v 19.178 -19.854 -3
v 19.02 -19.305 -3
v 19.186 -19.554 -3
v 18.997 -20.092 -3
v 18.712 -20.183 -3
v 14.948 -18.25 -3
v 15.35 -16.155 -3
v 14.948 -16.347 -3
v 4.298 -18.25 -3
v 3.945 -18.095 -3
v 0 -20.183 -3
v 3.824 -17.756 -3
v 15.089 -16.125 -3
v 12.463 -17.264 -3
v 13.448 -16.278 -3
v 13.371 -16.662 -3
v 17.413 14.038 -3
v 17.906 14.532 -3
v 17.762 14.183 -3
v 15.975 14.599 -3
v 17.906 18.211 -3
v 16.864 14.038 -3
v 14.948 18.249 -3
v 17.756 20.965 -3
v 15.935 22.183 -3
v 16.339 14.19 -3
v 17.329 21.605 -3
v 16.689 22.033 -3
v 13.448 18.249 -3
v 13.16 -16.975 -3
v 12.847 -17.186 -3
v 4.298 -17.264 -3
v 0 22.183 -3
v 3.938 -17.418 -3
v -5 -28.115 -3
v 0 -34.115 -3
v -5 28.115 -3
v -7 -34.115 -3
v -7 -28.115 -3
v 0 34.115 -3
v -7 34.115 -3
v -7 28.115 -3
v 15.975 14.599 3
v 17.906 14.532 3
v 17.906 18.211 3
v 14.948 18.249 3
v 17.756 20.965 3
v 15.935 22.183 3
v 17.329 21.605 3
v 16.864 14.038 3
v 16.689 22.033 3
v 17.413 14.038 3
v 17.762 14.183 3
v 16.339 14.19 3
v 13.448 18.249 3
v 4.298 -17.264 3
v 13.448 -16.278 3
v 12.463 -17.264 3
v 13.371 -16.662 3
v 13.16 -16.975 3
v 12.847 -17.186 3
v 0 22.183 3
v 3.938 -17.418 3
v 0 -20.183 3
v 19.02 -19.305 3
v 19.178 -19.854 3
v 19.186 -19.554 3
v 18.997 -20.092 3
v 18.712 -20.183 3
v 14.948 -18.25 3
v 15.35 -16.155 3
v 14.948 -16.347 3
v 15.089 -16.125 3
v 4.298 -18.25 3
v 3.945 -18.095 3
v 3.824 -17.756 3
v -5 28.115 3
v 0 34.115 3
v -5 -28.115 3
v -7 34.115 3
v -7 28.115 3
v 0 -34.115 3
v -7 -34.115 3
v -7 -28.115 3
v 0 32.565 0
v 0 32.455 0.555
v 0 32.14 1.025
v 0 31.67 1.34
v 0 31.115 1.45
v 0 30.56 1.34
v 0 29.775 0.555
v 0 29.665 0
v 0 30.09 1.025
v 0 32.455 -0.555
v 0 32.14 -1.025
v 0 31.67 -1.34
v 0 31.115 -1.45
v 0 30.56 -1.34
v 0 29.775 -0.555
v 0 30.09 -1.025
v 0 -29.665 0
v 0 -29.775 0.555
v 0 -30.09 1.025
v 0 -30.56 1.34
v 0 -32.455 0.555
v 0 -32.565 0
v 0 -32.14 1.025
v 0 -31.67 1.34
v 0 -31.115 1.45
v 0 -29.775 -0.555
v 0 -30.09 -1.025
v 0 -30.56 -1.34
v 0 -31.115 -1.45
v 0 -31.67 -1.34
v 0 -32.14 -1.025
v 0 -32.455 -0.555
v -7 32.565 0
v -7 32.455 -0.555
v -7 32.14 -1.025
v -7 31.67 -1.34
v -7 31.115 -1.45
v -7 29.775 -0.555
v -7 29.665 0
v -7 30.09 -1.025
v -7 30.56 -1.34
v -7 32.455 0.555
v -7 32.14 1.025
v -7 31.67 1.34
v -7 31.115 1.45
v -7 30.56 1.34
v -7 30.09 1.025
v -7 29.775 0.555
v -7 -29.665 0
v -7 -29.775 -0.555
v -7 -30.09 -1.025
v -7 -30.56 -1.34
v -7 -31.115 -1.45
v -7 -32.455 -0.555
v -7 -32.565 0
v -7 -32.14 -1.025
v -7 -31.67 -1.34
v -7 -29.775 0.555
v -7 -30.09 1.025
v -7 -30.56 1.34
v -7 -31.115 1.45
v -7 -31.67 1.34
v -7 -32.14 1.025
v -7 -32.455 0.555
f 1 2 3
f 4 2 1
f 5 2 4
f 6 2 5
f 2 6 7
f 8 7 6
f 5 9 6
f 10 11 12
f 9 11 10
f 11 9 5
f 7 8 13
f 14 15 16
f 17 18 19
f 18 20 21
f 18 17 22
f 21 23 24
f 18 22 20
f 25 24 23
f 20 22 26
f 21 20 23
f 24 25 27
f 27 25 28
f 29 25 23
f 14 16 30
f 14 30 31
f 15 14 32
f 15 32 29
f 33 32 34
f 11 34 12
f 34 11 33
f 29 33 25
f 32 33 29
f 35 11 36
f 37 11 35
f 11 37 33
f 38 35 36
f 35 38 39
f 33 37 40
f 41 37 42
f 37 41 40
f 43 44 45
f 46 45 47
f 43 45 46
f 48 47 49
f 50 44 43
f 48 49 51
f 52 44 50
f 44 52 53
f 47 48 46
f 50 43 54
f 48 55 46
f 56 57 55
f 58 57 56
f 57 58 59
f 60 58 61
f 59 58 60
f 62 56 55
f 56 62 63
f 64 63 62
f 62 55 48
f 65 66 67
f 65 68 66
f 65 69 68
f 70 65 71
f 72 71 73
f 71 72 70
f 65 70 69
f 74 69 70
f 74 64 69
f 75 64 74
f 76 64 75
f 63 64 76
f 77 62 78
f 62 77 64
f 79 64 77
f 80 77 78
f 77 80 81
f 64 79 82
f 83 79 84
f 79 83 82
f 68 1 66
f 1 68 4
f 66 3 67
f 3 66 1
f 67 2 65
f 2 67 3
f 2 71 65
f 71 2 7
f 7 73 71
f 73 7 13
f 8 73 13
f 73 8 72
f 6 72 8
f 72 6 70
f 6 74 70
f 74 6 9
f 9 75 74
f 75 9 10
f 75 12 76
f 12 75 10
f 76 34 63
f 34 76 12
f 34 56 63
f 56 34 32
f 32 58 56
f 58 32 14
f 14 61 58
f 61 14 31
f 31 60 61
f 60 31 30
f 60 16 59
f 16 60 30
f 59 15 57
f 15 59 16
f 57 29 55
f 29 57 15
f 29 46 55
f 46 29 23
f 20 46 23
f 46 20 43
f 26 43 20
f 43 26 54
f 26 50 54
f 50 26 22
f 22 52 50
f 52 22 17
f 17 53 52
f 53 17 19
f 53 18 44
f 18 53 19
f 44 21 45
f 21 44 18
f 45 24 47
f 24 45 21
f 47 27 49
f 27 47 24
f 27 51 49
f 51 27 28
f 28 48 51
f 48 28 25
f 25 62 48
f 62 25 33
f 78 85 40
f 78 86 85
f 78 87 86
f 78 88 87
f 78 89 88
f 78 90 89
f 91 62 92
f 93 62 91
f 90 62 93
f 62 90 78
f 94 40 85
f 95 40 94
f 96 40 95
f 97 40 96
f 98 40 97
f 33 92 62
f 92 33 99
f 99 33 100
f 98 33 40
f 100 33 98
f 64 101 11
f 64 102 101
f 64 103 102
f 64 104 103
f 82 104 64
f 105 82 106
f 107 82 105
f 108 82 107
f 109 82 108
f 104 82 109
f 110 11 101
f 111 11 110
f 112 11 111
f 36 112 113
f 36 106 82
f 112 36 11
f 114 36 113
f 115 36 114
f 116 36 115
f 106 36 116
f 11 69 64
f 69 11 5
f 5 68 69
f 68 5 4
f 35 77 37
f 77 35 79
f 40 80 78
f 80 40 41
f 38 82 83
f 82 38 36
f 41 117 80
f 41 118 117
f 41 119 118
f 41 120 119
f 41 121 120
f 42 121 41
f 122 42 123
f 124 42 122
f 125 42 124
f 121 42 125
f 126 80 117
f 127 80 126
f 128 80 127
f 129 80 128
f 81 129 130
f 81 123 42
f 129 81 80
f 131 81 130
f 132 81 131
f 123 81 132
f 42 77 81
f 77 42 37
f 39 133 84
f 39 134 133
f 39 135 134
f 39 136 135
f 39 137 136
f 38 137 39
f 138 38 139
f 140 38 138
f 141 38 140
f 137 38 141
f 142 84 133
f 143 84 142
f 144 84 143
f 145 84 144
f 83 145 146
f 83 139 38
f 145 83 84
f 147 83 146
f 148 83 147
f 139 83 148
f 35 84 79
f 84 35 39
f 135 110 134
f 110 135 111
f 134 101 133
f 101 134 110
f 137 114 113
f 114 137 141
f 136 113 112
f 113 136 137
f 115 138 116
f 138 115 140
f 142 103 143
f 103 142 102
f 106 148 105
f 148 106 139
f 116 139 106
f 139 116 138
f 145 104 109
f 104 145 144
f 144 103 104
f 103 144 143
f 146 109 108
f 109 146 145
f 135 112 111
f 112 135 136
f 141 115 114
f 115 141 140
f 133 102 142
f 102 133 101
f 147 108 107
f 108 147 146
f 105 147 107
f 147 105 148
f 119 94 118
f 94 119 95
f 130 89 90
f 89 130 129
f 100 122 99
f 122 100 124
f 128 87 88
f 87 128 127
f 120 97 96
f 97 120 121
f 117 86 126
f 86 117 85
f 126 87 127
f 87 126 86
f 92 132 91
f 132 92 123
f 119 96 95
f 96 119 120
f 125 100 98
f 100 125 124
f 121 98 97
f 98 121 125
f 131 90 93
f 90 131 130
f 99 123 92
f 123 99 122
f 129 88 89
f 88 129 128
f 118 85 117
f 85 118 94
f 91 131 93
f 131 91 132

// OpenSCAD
// Remix of http://www.thingiverse.com/thing:806093

//Clip thickness
CLIP_H = 6;
// Holes diameter
HOLE_DIAMETER = 2.9;
// Distance between the 2 holes
PILLAR_PITCH = 62.23;

// Height of the mounting bar
MOUNT_H = 5;
// Height of pillars
PILLAR_H = 2;

PILLAR_1_Y_OFFSET = PILLAR_PITCH/2;
PILLAR_2_Y_OFFSET = -PILLAR_PITCH/2;

module shape()
{
    p = [[9.403850,21.092300],[9.584450,20.854000],[9.593250,20.554200],[9.427250,20.305200],[5.756350,17.154800],[5.495650,17.124500],[5.354950,17.347200],[5.354950,19.249500],[-5.295400,19.249500],[-5.647940,19.095200],[-5.769030,18.756400],[-5.654770,18.417500],[-5.295400,18.264200],[2.869650,18.264200],[3.253450,18.186000],[3.566950,17.975100],[3.777850,17.661600],[3.854950,17.277800],[3.854950,-17.249500],[5.354950,-17.249500],[6.381350,-13.599100],[6.745650,-13.189900],[7.271050,-13.038600],[7.819850,-13.038600],[8.168450,-13.183100],[8.312950,-13.531700],[8.312950,-17.211400],[8.162650,-19.965300],[7.735850,-20.605000],[7.096250,-21.032700],[6.341350,-21.183100],[-9.593250,-21.183100],[-9.593250,21.183100],[9.118650,21.183100]];
    
    xm = min([ for (x=p) x[0] ]);
    ym = min([ for (x=p) x[1] ]); 
    echo([xm, ym]);
    translate([0,22.183,0]) // This offset is know by displaying 
                            // DXF file a CAD software
        rotate([180,0,0])
            translate([-xm, -ym])
                polygon(p);
}

module din_clip() {

	difference() {
		
		union() {
            linear_extrude(height=CLIP_H, center=true, convexity=5) {
                //import(file="PCB_din_clip.dxf", $fn=64);
                shape();
            }
		      
            translate([-MOUNT_H/2, 0, 0]) {
                cube([MOUNT_H,PILLAR_PITCH+6,CLIP_H], center=true);
            }
            
            translate([-PILLAR_H/2-MOUNT_H, PILLAR_1_Y_OFFSET, 0]) {
				rotate([0, 0, 0]) {
					cube([PILLAR_H,6,CLIP_H], center = true);
				}
            }

            translate([-PILLAR_H/2-MOUNT_H, PILLAR_2_Y_OFFSET, 0]) {
				rotate([0, 0, 0]) {
					cube([PILLAR_H,6,CLIP_H], center = true);
				}
            }
		}

		union() {
			translate([-PILLAR_H-MOUNT_H-0.5, PILLAR_2_Y_OFFSET, 0]) {
				rotate([0, 90, 0]) {
					cylinder(h= PILLAR_H+MOUNT_H+1, r = HOLE_DIAMETER / 2, $fn = 16);
				}
			}
			translate([-PILLAR_H-MOUNT_H-0.5, PILLAR_1_Y_OFFSET, 0]) {
				rotate([0, 90, 0]) {
					cylinder(h= PILLAR_H+MOUNT_H+1, r = HOLE_DIAMETER / 2, $fn = 16);
				}
			}
		}
    }
}

din_clip();

